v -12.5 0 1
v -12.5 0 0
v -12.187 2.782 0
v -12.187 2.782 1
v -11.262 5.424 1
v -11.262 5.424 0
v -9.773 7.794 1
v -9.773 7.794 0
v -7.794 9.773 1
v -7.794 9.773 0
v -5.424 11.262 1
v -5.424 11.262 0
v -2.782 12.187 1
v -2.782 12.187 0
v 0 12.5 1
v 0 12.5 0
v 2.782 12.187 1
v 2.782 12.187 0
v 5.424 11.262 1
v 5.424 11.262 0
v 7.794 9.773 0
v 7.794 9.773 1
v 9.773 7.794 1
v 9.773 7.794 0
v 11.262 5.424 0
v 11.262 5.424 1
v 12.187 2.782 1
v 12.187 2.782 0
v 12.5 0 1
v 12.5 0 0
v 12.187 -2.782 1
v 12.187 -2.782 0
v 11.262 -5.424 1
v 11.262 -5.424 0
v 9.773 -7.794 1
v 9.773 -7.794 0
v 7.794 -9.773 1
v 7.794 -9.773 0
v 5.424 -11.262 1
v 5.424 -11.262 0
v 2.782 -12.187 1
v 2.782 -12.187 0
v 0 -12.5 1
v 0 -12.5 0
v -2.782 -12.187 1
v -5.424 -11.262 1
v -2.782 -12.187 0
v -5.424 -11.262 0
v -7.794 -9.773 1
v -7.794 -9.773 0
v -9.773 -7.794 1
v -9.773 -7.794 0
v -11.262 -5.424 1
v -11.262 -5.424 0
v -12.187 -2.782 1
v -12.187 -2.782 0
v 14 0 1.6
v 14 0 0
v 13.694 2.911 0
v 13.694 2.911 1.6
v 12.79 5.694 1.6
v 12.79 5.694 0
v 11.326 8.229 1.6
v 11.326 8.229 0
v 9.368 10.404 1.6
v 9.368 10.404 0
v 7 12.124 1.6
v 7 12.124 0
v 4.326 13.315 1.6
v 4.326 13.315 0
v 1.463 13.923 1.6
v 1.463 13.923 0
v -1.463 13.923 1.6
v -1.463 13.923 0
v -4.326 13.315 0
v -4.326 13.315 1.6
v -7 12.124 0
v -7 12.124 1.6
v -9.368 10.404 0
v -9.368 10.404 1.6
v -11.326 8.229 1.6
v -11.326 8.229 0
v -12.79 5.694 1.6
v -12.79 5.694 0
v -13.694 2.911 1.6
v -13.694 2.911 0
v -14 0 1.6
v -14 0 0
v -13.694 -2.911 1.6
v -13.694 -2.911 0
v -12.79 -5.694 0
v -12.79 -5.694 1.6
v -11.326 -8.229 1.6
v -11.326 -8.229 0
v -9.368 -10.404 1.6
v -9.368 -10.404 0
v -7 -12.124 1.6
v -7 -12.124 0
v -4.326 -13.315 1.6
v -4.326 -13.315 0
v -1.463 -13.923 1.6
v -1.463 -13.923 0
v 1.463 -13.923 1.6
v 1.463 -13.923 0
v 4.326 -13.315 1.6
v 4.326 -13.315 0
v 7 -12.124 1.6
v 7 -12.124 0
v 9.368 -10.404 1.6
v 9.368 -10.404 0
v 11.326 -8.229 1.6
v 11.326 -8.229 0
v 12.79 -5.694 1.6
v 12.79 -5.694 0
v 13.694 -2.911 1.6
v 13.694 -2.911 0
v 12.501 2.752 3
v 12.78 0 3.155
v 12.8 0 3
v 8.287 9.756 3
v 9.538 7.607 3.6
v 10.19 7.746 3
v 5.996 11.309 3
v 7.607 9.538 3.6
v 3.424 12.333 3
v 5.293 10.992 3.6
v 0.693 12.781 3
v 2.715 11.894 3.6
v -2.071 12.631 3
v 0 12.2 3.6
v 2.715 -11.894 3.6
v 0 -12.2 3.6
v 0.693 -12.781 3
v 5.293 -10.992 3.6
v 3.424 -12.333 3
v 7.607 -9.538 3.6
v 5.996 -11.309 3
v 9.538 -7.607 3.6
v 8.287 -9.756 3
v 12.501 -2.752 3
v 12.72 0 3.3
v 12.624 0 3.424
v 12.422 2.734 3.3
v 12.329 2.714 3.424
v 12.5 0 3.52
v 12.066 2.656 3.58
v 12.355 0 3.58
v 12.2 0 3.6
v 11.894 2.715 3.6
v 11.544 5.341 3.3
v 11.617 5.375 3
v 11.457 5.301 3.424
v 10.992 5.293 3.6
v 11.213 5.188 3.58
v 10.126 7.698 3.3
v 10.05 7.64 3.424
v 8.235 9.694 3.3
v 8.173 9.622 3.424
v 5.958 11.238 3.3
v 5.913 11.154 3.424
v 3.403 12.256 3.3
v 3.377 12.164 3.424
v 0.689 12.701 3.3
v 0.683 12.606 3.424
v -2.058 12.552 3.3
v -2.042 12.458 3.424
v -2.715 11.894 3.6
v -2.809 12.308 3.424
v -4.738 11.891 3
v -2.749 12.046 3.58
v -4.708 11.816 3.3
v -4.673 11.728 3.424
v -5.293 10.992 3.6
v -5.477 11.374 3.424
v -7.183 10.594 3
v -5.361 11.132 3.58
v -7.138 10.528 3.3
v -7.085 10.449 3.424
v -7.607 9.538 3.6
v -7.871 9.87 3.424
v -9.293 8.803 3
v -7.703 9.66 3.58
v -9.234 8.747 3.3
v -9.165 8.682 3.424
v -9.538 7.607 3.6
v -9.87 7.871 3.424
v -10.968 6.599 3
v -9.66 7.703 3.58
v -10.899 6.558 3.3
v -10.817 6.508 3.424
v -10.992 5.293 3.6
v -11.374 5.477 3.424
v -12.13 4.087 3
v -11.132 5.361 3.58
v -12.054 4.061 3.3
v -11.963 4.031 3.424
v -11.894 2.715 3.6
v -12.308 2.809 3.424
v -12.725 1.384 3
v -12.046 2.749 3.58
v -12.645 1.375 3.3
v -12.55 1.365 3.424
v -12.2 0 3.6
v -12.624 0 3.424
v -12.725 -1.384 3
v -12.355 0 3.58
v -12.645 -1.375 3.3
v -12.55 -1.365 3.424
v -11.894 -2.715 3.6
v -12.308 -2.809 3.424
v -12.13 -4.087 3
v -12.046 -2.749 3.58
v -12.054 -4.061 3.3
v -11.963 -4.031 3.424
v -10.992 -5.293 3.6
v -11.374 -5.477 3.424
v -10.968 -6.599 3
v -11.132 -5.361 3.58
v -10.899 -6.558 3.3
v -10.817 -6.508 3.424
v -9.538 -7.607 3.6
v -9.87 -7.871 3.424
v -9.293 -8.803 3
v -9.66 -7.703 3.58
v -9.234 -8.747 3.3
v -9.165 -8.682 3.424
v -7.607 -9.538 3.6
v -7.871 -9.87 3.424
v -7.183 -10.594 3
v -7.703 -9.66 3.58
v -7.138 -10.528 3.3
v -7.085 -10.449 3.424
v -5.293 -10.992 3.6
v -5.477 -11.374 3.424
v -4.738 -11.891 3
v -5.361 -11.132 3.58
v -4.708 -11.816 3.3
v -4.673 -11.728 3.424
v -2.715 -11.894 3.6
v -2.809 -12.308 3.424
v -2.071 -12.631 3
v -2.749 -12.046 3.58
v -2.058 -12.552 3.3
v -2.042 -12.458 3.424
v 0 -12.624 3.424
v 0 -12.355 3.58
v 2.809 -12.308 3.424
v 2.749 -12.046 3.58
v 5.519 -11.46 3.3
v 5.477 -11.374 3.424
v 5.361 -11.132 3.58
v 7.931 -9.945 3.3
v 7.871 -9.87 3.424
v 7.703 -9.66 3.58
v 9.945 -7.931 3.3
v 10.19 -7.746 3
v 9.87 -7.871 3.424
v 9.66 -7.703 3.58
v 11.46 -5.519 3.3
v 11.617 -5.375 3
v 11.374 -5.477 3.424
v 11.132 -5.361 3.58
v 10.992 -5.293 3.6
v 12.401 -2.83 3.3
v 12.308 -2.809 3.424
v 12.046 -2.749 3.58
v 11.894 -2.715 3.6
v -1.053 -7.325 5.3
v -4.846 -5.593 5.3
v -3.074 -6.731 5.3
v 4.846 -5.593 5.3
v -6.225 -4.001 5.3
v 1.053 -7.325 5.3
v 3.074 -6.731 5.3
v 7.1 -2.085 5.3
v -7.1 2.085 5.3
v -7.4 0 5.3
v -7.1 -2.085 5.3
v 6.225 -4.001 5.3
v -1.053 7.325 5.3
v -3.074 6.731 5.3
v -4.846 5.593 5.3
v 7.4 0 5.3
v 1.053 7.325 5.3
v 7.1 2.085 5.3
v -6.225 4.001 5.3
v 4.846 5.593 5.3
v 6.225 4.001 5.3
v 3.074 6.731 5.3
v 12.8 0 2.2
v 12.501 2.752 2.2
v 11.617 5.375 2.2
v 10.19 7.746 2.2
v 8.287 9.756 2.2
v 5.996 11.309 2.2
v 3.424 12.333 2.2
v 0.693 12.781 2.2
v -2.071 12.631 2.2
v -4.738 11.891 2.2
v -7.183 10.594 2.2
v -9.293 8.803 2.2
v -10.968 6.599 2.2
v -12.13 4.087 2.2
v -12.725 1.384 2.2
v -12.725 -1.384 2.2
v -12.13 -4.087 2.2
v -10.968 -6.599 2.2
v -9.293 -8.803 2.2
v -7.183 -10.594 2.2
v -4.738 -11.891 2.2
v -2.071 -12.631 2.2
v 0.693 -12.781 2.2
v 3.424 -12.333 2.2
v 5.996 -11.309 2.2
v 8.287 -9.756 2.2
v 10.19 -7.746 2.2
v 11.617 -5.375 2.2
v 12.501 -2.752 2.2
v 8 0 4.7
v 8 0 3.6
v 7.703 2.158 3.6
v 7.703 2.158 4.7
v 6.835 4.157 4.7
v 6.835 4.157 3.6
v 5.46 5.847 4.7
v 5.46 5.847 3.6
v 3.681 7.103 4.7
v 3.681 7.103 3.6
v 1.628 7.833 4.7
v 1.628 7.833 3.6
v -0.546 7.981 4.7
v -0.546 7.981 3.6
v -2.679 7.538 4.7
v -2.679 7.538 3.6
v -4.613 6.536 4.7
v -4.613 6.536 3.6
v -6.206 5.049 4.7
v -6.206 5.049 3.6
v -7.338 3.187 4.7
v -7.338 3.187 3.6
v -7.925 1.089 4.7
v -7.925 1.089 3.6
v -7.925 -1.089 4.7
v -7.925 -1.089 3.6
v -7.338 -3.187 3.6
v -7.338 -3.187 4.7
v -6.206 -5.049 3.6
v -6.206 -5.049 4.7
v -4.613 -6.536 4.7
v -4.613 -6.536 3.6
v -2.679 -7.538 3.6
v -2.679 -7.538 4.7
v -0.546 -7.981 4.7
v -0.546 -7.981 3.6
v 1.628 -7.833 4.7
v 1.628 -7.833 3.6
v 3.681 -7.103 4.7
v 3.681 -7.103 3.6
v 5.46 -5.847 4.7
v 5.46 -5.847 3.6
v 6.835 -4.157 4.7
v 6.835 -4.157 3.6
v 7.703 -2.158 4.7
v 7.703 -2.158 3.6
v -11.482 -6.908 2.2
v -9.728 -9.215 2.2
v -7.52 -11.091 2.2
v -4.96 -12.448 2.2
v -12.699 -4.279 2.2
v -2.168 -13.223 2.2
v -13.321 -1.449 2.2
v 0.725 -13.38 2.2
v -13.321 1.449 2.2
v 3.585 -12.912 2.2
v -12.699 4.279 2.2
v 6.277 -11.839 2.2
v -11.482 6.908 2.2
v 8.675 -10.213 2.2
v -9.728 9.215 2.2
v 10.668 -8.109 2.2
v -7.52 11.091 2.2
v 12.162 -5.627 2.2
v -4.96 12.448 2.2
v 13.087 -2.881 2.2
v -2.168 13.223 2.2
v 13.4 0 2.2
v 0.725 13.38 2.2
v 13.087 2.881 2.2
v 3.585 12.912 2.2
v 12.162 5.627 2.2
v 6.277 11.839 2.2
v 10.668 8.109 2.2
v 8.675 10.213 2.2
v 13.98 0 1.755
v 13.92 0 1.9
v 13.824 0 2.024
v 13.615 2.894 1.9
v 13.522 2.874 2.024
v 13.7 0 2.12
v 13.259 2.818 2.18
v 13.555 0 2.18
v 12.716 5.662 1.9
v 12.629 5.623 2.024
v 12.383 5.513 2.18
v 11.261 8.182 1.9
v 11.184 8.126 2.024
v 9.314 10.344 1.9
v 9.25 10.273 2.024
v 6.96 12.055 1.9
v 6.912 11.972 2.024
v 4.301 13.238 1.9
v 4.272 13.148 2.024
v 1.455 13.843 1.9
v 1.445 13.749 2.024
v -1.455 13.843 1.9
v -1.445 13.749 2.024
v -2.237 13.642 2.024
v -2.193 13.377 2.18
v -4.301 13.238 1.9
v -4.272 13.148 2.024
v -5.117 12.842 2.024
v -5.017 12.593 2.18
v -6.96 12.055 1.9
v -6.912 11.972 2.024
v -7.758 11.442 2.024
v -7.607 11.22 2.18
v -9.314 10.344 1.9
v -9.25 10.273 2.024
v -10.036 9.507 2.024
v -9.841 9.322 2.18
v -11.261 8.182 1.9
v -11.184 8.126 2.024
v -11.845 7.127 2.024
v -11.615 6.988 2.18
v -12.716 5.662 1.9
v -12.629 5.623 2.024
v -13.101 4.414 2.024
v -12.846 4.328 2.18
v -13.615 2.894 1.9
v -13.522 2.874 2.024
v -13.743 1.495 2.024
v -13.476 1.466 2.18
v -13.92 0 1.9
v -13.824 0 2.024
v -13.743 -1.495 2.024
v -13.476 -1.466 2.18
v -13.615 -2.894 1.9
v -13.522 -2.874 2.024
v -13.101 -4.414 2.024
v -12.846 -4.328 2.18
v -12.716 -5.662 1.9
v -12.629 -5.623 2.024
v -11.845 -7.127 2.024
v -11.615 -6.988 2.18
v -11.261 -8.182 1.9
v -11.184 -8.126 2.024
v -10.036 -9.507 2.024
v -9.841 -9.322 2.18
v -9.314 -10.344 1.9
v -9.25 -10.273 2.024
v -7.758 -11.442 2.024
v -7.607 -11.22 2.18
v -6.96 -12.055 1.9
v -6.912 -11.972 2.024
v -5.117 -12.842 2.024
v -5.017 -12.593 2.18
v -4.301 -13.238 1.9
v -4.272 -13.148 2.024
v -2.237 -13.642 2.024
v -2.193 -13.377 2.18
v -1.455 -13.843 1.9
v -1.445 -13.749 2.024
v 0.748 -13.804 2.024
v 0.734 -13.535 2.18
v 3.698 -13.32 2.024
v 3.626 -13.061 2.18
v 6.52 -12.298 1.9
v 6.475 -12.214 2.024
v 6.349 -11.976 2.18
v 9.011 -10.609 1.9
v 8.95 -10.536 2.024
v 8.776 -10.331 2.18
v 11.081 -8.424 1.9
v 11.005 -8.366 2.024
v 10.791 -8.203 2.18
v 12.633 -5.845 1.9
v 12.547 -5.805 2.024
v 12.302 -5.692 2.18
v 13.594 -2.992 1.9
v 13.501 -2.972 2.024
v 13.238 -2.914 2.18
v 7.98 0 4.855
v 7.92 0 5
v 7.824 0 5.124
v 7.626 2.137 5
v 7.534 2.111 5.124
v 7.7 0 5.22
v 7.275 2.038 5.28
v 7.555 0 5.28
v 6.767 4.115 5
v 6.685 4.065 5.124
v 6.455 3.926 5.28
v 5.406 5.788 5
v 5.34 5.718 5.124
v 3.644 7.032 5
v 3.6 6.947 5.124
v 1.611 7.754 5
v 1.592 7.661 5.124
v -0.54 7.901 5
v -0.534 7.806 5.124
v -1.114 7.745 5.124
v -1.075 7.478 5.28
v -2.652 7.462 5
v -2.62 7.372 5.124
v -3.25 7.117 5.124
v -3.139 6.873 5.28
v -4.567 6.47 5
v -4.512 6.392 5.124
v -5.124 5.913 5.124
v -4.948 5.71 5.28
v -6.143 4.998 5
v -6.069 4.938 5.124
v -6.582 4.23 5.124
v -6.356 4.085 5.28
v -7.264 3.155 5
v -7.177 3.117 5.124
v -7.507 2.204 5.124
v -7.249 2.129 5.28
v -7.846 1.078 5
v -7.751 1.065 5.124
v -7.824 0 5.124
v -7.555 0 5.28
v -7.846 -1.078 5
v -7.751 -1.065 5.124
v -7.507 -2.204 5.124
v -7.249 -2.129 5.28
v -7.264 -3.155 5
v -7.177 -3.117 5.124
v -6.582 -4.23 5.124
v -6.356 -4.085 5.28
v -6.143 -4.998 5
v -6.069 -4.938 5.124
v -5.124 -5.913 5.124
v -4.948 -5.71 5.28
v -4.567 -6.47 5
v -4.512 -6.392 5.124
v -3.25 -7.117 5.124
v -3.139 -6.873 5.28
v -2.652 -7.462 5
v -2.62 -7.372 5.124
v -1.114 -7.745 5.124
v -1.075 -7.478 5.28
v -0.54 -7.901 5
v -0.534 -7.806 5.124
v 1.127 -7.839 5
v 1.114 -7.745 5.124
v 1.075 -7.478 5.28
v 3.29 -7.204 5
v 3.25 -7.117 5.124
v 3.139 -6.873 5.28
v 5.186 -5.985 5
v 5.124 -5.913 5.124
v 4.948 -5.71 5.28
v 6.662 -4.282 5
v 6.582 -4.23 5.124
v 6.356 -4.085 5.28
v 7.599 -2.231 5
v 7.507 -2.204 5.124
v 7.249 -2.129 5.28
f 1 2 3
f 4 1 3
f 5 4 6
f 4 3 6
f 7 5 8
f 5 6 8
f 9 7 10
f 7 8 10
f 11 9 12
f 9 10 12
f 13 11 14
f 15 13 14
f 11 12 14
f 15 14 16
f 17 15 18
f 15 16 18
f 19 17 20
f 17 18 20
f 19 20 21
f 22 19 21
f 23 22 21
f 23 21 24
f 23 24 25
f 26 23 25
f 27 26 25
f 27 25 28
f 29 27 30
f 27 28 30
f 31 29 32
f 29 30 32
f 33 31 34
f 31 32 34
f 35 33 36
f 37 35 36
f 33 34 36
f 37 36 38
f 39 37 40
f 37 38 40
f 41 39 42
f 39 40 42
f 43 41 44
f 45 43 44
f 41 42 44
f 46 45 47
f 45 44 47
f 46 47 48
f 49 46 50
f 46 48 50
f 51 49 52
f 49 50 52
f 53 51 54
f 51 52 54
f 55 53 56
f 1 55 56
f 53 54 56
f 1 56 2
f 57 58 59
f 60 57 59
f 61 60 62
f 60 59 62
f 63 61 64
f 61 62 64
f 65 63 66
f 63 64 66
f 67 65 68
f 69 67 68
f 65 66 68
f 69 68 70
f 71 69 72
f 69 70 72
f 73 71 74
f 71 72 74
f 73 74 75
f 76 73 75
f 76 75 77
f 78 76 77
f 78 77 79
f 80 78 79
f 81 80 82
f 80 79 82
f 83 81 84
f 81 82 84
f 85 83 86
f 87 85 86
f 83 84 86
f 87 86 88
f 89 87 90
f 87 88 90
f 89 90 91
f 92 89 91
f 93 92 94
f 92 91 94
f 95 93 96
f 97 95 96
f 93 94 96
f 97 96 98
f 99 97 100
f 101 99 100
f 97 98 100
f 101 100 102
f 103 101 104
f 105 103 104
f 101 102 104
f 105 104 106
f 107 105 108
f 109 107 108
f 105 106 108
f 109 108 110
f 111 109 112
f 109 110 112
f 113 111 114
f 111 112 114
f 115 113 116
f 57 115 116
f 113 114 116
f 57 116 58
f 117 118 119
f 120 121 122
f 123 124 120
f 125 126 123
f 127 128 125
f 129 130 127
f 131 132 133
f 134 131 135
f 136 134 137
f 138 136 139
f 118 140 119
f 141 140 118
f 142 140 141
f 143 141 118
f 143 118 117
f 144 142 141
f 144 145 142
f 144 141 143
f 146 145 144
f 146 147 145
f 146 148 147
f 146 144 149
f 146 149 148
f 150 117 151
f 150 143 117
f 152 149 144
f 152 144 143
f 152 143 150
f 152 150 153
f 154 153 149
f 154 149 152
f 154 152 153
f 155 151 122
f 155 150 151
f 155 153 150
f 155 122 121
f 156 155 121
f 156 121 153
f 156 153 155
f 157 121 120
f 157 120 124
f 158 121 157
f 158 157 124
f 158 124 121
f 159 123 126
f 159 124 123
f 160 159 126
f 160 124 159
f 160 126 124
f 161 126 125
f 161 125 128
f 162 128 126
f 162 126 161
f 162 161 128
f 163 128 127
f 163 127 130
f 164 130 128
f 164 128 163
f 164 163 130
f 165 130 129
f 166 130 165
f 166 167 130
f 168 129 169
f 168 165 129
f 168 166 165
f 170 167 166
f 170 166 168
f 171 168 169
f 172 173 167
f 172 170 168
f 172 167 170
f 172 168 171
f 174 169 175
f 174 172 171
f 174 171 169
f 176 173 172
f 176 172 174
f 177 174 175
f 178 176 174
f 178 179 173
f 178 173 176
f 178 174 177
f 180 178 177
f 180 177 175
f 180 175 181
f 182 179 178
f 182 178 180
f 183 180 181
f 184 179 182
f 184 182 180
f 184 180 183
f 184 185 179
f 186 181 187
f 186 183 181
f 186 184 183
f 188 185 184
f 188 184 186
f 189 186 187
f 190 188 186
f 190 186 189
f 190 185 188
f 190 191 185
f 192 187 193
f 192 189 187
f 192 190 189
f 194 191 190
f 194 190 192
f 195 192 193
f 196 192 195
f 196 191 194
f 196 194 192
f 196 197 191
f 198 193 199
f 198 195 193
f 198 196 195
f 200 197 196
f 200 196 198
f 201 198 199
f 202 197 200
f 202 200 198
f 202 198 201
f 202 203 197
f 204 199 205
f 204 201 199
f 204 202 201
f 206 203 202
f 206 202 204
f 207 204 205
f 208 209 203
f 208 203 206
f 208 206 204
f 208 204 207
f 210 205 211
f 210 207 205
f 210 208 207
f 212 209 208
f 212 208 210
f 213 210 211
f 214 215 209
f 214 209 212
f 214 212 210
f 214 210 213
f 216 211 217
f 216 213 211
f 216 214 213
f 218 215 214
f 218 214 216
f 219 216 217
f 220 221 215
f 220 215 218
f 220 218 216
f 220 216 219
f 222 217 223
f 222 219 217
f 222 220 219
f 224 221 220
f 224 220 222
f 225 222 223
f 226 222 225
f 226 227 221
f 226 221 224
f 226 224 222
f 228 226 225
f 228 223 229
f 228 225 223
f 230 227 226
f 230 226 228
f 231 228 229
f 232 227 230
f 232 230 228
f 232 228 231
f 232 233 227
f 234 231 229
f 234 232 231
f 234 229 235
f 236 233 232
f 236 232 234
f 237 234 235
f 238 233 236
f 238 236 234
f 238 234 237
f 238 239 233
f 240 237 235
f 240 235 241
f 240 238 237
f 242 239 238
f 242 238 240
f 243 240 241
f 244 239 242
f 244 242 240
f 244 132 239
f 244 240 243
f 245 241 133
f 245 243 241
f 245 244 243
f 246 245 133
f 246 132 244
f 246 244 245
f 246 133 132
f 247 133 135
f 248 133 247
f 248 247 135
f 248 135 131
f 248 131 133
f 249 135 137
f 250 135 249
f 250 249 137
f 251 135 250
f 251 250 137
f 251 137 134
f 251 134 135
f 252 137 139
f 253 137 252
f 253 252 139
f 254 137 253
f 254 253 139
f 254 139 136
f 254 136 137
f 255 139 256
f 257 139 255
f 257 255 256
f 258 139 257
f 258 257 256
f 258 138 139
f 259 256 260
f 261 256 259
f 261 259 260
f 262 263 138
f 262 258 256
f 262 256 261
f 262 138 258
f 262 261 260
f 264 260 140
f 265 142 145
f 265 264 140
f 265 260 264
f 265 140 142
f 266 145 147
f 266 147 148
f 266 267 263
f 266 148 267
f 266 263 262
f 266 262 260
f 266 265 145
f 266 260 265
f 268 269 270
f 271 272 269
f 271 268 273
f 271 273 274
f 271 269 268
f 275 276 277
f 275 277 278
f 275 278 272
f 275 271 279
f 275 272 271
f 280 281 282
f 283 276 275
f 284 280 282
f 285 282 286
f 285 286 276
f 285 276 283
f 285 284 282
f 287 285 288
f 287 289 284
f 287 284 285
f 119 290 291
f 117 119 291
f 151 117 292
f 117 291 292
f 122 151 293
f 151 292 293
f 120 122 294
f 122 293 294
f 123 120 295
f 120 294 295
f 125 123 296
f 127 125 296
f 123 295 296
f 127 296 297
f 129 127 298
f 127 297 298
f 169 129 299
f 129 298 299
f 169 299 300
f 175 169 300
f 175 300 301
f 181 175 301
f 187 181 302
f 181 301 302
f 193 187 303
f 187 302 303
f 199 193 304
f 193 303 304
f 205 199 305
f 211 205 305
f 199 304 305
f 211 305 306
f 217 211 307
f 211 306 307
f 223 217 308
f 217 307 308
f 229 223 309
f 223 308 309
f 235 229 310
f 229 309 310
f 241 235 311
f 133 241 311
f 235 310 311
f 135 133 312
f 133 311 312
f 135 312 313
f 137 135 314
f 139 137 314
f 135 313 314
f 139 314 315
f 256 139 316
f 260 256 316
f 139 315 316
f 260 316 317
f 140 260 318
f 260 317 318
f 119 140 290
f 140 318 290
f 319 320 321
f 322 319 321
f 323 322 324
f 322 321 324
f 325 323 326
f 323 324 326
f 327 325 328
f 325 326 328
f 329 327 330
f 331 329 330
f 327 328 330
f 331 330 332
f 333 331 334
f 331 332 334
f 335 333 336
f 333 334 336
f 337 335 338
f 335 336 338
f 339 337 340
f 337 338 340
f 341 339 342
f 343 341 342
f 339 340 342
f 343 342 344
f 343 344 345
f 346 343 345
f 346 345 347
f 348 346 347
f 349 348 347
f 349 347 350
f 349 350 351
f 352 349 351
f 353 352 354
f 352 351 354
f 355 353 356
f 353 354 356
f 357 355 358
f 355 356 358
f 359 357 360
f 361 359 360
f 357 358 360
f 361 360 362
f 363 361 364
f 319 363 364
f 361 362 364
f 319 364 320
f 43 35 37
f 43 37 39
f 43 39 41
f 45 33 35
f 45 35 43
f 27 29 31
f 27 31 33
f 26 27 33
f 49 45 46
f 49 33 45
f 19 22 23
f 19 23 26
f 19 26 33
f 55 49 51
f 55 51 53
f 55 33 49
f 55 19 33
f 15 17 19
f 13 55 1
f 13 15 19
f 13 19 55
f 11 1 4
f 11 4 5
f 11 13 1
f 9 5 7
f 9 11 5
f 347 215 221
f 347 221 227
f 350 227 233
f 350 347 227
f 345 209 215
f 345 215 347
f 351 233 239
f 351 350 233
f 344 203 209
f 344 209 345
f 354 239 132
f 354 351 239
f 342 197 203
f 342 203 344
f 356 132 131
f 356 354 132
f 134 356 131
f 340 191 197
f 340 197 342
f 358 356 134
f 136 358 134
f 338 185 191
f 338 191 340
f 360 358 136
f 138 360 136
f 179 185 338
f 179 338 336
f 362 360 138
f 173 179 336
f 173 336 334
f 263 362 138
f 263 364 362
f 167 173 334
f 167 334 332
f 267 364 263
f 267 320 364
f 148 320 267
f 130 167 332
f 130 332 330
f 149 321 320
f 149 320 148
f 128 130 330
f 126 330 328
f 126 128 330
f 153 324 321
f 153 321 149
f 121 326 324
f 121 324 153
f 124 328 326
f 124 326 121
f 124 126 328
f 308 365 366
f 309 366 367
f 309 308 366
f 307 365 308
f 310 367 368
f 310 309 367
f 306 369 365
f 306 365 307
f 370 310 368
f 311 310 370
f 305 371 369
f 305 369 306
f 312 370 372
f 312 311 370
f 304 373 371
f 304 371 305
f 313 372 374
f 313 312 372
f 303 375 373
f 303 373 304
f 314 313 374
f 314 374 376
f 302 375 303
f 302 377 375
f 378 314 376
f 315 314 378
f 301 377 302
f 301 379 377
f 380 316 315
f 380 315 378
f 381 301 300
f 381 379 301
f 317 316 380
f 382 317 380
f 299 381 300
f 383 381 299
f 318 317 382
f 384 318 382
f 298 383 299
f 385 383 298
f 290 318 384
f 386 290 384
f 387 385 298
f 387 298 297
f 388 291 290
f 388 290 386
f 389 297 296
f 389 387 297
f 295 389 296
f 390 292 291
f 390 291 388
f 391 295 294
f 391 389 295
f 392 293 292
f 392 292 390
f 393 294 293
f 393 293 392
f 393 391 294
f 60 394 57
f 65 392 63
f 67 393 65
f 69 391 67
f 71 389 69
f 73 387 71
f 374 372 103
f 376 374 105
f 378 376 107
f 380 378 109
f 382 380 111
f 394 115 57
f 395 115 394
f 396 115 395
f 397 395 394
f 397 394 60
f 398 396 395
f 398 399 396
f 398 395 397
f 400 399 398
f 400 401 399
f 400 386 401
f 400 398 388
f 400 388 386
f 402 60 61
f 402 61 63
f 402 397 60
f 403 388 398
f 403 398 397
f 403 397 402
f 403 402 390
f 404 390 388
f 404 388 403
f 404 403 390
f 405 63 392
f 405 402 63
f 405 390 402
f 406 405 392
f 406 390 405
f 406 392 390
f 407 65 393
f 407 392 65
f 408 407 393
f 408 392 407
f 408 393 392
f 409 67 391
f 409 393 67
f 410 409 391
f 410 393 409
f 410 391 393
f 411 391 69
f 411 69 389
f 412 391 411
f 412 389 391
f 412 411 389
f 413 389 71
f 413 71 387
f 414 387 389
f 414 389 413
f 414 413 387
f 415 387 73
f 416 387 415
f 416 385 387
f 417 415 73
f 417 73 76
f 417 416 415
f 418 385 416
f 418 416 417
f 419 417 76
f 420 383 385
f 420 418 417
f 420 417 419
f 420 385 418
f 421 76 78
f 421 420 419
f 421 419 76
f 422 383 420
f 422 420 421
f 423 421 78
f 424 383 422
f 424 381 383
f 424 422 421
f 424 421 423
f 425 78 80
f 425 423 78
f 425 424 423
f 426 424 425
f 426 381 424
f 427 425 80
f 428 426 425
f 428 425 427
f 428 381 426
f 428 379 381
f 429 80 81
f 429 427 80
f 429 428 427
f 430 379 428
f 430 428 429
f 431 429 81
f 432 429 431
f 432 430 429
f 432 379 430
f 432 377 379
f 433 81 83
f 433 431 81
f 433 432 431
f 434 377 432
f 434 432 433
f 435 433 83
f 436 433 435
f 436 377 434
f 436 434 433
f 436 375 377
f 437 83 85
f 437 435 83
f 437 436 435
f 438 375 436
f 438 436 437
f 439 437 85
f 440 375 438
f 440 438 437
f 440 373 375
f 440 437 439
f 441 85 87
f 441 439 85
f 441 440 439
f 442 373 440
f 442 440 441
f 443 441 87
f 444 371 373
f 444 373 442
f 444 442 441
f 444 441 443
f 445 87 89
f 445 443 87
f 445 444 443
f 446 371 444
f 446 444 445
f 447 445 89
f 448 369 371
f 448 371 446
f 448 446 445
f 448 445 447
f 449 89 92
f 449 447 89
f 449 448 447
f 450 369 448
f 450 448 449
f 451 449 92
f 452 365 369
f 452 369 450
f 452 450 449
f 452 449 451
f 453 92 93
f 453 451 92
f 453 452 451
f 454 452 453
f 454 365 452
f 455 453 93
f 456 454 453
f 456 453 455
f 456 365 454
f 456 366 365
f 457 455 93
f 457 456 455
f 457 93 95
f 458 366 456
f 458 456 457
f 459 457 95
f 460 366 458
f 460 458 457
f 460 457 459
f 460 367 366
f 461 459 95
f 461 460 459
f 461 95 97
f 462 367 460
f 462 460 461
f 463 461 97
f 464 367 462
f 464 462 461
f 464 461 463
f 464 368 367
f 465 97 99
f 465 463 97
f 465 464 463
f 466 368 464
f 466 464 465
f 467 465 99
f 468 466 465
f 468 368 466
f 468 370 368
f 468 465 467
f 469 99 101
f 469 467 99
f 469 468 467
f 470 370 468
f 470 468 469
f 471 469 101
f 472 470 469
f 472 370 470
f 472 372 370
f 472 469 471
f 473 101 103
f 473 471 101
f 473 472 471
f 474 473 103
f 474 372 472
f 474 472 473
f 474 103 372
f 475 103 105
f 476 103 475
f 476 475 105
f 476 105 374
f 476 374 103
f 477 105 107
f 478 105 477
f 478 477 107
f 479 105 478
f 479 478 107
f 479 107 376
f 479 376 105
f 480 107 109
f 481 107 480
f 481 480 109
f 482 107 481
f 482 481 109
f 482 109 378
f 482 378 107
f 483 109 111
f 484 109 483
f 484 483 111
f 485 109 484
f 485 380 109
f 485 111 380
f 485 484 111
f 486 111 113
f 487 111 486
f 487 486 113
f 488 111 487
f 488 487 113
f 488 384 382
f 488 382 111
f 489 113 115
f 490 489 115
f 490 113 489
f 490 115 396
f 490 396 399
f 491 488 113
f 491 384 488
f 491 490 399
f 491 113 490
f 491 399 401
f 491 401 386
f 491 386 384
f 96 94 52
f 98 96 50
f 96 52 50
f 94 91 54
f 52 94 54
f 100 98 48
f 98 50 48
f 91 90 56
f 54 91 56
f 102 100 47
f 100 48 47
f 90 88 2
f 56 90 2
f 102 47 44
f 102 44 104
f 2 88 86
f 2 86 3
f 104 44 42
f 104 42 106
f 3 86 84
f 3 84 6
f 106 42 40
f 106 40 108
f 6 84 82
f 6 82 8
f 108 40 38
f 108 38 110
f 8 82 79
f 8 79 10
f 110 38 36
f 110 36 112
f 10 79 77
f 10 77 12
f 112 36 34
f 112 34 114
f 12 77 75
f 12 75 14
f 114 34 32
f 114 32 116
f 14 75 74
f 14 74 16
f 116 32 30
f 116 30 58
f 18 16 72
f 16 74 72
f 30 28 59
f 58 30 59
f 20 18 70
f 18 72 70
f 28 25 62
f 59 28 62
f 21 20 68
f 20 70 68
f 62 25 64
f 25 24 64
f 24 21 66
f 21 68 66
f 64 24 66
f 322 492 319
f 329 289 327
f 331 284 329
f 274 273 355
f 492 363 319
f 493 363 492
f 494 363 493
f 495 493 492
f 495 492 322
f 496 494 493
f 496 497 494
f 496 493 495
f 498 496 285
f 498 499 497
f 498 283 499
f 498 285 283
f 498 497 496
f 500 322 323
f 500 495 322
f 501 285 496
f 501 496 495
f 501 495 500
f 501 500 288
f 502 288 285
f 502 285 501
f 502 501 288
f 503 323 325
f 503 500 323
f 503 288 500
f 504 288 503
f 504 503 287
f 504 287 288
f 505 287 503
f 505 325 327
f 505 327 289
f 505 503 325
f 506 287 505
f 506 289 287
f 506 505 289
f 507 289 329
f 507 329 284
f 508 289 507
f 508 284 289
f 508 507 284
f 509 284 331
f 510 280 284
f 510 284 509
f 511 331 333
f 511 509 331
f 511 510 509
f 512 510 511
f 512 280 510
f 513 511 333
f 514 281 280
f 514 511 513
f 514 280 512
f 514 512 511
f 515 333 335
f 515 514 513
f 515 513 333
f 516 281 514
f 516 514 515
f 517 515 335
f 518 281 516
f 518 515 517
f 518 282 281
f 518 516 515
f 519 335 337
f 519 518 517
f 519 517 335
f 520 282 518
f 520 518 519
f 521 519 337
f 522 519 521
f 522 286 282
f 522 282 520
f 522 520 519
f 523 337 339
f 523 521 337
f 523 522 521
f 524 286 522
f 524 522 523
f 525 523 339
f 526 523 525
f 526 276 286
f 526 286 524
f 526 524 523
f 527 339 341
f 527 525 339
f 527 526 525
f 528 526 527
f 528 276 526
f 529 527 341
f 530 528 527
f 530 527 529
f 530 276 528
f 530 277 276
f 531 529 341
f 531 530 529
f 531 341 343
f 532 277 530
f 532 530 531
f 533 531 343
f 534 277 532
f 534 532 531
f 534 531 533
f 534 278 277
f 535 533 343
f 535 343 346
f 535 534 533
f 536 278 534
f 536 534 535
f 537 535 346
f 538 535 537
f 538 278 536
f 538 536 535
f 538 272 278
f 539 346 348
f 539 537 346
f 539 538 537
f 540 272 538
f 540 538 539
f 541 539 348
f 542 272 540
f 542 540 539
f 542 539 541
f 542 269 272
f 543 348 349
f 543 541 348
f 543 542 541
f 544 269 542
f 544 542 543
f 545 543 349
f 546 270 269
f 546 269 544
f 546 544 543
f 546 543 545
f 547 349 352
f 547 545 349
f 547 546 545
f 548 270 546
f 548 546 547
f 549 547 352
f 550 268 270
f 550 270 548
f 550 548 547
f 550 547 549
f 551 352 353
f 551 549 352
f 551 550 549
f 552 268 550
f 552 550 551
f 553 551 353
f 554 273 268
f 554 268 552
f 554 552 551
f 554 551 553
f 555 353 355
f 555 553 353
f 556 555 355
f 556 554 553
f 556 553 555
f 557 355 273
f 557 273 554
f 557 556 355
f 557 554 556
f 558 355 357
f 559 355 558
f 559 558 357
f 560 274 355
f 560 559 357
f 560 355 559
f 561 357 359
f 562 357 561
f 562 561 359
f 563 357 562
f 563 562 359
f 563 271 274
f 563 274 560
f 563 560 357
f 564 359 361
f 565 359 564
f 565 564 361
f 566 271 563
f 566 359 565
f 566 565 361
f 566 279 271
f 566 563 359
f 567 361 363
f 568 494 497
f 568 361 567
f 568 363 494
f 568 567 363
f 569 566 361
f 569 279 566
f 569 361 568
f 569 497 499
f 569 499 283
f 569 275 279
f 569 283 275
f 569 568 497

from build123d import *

# Parameters (mm, degrees)
ESQUISSE1_R             = 14
BOSS_EXTRU_1_DEPTH      = 2.2
ESQUISSE2_R             = 12.8
BOSS_EXTRU_2_DEPTH      = 1.4
ESQUISSE3_R             = 8
BOSS_EXTRU_3_DEPTH      = 1.7
ESQUISSE4_R             = 12.5
ENL_V_MAT_EXTRU_1_DEPTH = 1
CONG_1_R                = 0.6


with BuildPart() as part:
    # Esquisse1 → Boss.-Extru.1 (new body)
    with BuildSketch(Plane.XY):
        Circle(ESQUISSE1_R)
    extrude(amount=BOSS_EXTRU_1_DEPTH)

    # Esquisse2 → Boss.-Extru.2 (add)
    with BuildSketch(Plane.XY.offset(2.2)):
        Circle(ESQUISSE2_R)
    extrude(amount=BOSS_EXTRU_2_DEPTH)

    # Esquisse3 → Boss.-Extru.3 (add)
    with BuildSketch(Plane.XY.offset(3.6)):
        Circle(ESQUISSE3_R)
    extrude(amount=BOSS_EXTRU_3_DEPTH)

    # Esquisse4 → Enlèv. mat.-Extru.1 (cut)
    with BuildSketch(Plane(origin=(0, 0, 0), x_dir=(-1, 0, 0), z_dir=(0, 0, -1))):
        Circle(ESQUISSE4_R)
    extrude(amount=-ENL_V_MAT_EXTRU_1_DEPTH, mode=Mode.SUBTRACT)

    # Congé1
    cong_1_edges = [part.edges().sort_by_distance(p)[0] for p in [
        (-8, 0, 5.3),
        (-14, 0, 2.2),
        (-12.8, 0, 3.6),
    ]]
    fillet(cong_1_edges, radius=CONG_1_R)


solid = part.part
